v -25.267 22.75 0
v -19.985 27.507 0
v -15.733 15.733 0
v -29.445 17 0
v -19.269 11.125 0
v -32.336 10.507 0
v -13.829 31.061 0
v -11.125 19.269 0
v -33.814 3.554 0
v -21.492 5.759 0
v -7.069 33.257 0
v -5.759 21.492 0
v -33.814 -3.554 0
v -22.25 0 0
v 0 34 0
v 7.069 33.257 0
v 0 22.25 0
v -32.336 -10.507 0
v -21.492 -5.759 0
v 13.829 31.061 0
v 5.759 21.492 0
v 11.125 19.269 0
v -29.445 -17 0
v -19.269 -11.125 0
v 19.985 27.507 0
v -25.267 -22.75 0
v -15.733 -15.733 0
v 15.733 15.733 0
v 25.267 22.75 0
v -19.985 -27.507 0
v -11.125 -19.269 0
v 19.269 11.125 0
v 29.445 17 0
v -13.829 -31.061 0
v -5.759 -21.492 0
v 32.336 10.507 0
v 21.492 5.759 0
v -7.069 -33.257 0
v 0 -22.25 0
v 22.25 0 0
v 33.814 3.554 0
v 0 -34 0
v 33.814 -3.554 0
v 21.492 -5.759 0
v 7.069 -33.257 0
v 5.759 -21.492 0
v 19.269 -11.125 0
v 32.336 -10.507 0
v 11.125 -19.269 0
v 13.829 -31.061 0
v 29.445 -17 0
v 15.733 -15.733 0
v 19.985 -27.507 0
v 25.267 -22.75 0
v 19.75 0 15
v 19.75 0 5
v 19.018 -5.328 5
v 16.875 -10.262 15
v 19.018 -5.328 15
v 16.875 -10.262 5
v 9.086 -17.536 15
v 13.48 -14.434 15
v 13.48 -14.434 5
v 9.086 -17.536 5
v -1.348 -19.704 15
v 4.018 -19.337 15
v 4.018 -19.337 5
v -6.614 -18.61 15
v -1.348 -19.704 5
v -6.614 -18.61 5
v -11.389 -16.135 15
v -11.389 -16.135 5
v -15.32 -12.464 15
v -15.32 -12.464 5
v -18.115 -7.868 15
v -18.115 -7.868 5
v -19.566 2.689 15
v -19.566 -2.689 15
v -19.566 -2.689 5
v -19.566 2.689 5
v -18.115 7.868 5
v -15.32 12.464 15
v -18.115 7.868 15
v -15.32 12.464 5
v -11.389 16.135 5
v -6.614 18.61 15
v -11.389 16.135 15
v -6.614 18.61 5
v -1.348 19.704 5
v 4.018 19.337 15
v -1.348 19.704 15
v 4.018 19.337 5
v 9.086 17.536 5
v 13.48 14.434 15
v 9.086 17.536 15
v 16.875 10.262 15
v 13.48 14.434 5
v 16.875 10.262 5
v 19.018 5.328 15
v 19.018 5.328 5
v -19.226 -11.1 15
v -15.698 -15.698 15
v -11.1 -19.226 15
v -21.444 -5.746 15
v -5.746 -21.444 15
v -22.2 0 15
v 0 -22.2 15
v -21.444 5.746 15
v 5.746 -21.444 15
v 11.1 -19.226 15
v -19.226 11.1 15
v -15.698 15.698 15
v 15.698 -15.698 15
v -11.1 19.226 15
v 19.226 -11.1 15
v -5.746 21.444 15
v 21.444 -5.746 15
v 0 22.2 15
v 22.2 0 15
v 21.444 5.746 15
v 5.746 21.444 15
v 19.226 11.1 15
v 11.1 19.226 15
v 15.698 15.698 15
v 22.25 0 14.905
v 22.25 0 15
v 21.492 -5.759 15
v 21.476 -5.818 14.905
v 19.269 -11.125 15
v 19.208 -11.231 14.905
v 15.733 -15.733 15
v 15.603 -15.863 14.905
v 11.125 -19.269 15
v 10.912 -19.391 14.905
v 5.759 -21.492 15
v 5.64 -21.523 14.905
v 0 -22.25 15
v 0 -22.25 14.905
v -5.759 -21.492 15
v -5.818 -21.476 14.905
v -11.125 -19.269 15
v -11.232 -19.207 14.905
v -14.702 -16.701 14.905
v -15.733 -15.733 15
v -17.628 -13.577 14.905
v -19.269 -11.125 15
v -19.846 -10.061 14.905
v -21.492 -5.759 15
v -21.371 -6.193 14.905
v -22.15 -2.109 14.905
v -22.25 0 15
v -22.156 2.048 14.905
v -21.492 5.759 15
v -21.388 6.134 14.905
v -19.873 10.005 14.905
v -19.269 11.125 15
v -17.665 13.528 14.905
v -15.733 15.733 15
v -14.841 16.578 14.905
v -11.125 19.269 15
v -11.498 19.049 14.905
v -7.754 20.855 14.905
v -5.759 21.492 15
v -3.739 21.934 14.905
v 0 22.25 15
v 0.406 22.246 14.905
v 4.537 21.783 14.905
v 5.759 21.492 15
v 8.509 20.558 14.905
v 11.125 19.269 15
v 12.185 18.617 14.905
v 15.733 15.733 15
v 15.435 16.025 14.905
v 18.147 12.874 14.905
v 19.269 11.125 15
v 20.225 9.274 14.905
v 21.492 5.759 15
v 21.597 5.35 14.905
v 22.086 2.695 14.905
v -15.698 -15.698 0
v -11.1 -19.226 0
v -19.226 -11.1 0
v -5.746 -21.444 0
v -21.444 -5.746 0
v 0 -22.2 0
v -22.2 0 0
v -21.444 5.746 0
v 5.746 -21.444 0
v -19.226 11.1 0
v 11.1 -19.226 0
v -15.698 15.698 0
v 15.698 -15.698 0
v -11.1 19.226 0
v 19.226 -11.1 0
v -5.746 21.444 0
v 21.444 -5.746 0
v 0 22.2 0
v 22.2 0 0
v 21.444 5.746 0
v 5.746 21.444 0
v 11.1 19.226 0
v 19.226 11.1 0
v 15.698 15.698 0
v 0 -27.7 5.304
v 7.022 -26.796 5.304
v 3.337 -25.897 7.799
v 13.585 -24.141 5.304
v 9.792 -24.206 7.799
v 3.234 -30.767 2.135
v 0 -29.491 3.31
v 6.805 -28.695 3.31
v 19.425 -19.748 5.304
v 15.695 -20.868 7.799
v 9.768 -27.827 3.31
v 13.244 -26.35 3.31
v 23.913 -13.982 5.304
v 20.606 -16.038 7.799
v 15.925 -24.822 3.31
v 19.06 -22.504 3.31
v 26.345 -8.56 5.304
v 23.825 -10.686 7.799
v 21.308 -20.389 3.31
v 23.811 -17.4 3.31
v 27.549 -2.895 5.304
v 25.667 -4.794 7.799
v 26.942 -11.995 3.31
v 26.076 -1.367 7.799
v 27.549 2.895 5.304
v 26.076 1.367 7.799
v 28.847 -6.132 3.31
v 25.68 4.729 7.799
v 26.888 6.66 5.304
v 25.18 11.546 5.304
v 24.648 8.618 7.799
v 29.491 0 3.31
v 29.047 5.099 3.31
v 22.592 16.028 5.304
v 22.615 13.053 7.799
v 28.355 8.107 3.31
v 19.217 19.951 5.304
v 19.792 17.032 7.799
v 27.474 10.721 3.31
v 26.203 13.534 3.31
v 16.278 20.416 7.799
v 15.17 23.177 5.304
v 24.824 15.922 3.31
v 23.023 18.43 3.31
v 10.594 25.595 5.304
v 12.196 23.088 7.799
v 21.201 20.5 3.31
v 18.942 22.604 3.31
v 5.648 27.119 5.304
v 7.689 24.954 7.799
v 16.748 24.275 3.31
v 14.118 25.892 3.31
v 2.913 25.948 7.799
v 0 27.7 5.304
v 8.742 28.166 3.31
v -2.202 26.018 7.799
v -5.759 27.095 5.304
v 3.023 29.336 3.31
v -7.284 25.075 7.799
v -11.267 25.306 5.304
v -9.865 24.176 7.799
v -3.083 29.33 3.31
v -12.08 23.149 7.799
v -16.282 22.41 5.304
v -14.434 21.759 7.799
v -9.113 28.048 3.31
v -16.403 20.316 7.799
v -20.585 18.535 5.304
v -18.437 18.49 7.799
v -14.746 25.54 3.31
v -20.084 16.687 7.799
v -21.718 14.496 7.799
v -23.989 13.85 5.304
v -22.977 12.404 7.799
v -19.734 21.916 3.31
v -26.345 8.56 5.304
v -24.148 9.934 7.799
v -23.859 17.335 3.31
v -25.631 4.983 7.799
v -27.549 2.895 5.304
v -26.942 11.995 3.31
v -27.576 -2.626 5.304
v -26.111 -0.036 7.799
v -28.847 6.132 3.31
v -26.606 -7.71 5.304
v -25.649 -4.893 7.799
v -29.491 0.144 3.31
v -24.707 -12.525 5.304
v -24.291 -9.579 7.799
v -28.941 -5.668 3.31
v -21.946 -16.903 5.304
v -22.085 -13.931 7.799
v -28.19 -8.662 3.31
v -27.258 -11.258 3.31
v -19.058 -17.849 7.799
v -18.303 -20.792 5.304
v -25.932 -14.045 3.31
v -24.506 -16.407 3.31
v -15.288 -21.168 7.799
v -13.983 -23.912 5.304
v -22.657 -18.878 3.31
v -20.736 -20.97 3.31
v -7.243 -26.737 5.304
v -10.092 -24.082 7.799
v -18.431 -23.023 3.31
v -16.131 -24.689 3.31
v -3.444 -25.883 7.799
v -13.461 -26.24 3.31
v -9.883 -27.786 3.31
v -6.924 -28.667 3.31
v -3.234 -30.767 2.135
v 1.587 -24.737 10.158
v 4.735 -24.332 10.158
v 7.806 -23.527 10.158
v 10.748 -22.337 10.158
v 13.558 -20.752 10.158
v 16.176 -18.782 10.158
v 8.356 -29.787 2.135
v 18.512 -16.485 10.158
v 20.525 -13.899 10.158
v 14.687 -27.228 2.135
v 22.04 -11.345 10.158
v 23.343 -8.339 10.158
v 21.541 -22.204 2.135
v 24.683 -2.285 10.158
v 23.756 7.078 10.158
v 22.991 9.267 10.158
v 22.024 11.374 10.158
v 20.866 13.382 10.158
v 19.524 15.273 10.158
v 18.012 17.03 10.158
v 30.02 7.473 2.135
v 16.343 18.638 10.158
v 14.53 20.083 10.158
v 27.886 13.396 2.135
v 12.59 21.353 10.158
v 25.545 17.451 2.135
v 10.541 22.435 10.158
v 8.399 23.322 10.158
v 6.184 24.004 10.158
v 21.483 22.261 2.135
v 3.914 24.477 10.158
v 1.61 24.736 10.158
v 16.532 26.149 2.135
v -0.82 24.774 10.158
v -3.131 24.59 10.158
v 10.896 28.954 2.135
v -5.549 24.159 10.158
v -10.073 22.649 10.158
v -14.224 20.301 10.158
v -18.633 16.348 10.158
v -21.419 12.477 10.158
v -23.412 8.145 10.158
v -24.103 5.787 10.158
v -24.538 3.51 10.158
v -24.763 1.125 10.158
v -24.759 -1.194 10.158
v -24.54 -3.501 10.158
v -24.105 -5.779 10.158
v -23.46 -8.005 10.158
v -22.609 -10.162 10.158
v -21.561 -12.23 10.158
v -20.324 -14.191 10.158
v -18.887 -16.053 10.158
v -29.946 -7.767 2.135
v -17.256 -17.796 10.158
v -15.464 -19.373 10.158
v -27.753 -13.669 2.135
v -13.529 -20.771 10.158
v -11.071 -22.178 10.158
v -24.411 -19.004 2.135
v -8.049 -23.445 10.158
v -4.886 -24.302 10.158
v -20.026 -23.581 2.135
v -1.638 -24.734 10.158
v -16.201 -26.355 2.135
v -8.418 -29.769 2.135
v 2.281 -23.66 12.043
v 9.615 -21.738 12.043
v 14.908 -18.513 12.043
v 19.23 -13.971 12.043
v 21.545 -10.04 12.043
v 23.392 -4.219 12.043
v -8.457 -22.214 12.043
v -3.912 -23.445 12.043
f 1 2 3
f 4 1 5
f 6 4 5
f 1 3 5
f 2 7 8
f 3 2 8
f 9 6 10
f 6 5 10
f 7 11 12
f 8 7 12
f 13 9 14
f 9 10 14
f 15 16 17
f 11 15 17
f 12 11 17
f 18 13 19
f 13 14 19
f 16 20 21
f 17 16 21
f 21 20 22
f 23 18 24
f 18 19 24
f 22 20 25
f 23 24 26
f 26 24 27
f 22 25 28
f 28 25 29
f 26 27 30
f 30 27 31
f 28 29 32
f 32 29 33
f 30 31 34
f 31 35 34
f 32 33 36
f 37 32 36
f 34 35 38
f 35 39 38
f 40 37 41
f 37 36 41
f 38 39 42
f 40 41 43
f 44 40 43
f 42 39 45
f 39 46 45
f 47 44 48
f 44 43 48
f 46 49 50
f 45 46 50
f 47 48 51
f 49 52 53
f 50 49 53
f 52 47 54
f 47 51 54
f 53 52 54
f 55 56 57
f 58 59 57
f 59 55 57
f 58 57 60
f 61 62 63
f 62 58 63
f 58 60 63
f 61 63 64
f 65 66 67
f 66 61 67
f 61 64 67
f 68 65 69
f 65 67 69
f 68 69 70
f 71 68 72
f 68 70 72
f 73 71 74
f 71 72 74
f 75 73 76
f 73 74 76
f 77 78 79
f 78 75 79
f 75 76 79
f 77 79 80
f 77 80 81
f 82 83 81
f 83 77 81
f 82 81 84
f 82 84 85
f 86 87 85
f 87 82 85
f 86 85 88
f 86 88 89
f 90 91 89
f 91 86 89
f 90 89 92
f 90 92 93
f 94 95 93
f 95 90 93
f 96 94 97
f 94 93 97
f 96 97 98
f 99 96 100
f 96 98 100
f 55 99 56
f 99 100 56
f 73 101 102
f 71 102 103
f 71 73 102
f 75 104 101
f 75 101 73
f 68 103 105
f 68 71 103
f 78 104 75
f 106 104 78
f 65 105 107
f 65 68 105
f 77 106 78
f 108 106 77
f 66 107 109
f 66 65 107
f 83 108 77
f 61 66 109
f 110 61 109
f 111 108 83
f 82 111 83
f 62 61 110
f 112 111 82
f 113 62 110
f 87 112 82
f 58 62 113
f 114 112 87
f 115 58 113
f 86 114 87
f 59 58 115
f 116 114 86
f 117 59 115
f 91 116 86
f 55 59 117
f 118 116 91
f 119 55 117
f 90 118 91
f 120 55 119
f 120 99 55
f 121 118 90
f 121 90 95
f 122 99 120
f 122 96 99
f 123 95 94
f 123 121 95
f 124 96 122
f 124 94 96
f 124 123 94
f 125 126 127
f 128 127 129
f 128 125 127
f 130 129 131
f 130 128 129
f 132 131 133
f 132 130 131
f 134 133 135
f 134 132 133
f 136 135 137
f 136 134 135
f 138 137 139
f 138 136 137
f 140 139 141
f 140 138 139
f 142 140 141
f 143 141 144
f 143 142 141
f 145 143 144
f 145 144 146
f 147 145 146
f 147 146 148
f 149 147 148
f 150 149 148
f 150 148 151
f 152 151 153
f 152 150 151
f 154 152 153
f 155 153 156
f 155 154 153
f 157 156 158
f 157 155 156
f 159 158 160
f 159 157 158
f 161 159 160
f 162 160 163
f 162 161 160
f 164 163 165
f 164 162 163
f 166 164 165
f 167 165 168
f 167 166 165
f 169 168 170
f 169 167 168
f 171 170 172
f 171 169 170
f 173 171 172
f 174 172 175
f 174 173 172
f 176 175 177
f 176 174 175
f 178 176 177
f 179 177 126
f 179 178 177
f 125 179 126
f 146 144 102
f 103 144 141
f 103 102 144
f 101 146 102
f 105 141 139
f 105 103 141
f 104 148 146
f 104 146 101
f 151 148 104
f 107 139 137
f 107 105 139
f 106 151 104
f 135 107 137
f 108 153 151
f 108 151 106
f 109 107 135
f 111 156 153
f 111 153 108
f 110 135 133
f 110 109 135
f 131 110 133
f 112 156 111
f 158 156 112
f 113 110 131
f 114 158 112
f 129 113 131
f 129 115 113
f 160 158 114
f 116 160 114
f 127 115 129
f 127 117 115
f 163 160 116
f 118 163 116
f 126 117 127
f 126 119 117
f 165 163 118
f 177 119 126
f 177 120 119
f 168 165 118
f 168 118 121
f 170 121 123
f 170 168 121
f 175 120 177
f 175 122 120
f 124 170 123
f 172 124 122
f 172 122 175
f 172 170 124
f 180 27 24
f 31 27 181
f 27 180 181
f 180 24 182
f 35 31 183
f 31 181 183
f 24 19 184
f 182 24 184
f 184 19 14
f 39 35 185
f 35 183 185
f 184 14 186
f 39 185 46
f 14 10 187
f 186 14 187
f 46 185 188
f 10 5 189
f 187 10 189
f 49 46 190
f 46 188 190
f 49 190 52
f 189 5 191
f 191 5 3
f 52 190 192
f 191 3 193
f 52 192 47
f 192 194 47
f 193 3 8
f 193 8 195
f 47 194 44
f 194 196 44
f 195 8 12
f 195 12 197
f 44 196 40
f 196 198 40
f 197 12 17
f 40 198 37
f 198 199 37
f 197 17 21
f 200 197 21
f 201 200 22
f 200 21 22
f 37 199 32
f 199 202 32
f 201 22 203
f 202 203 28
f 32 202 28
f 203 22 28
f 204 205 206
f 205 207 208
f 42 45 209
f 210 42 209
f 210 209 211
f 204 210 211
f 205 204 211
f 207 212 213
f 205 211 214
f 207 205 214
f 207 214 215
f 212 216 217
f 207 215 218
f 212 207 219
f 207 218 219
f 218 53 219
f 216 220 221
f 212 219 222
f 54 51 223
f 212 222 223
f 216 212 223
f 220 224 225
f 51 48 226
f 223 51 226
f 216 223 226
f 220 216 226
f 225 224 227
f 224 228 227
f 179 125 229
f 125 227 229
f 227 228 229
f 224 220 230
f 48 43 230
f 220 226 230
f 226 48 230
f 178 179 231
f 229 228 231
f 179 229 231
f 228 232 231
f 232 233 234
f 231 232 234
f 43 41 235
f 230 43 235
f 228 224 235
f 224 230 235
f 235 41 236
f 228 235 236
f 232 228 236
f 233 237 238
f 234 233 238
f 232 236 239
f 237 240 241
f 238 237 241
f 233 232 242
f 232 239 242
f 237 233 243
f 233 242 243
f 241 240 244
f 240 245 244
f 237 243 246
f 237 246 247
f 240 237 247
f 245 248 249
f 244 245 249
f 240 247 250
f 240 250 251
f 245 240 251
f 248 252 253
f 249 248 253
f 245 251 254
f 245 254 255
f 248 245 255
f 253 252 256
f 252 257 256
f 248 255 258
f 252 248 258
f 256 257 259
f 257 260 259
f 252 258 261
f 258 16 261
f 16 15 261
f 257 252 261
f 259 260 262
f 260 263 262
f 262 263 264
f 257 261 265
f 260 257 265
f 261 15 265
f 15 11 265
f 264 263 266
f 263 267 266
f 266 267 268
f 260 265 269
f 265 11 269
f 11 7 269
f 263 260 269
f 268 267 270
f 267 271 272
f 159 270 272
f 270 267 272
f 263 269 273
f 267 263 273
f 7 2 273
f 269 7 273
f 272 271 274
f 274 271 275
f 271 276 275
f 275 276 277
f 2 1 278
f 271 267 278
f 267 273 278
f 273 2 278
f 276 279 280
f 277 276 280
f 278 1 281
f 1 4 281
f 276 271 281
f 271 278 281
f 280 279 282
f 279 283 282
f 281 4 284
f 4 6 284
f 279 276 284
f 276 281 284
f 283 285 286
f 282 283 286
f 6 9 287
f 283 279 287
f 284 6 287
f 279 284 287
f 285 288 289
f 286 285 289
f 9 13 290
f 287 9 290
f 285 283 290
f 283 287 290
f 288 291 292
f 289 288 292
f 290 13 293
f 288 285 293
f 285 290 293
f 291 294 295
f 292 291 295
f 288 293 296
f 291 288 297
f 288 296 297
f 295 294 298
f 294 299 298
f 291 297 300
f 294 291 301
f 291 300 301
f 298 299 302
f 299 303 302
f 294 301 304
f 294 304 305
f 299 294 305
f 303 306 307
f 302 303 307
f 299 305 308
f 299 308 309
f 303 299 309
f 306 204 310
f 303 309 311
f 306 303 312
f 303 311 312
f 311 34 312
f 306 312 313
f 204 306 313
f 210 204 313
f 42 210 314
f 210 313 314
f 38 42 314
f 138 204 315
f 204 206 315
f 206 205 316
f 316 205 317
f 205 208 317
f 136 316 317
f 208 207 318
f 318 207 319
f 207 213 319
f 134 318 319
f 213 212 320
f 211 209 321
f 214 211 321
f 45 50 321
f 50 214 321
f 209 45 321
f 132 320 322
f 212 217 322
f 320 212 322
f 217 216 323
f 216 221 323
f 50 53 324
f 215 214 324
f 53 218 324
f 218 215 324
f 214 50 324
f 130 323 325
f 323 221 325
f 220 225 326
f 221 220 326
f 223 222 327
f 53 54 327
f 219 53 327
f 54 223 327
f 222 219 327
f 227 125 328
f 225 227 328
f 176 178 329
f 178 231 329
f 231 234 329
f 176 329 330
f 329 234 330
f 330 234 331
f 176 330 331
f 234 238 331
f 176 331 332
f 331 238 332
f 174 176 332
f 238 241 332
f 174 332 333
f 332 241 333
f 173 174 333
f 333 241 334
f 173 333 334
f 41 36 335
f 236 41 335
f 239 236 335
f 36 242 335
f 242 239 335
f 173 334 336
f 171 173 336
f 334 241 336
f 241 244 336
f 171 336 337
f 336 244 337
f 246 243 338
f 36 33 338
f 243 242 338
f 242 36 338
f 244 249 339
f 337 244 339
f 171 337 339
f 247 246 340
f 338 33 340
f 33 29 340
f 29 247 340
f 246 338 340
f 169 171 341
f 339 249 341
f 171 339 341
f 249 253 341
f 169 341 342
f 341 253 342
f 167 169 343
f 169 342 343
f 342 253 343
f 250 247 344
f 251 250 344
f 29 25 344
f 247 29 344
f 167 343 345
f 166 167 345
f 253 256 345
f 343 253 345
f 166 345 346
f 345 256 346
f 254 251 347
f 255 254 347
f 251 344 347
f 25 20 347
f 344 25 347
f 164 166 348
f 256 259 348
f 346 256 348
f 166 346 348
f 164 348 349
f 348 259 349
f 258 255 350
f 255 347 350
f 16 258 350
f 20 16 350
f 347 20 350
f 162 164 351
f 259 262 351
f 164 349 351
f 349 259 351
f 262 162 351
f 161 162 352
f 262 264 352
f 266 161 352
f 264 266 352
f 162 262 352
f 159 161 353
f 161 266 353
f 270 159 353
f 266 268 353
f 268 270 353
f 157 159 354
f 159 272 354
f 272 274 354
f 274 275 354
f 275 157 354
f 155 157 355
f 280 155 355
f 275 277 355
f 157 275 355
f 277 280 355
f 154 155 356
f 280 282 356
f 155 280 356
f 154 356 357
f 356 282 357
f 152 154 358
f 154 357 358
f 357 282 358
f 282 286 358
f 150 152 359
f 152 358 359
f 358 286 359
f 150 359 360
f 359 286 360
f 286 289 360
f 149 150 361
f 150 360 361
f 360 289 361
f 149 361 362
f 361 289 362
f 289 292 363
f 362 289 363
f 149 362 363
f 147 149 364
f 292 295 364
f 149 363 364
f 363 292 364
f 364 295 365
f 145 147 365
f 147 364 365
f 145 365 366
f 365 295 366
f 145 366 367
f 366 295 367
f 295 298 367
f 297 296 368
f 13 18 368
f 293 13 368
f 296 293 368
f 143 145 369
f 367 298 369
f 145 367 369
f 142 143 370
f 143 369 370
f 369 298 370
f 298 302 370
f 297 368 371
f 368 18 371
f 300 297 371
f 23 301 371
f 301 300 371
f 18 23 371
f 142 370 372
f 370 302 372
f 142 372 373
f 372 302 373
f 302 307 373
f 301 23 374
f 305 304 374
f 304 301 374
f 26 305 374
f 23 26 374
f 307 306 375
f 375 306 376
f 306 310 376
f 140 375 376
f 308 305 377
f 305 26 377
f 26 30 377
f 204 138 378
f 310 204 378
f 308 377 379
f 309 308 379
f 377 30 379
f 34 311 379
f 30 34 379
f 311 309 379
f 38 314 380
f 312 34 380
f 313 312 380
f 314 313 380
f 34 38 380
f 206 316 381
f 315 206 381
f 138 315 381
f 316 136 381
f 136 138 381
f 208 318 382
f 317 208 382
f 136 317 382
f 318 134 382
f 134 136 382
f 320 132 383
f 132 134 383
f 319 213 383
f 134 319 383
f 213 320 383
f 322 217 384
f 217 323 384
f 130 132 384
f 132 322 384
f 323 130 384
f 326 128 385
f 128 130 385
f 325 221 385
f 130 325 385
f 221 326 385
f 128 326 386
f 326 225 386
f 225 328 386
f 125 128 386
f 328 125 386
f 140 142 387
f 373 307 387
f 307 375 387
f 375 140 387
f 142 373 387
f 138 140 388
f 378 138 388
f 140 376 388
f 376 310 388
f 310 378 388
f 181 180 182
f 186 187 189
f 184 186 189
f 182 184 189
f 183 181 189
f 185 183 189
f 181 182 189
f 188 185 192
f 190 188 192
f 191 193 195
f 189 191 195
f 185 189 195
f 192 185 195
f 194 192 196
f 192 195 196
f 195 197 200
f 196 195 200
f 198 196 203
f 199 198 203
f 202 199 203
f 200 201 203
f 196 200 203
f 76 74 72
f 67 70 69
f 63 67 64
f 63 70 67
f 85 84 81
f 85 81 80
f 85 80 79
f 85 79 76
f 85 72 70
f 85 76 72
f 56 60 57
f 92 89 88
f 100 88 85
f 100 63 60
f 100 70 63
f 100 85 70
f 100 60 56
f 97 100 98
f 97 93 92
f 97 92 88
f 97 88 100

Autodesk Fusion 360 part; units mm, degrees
sketch "Sketch1" plane through (0, 0, 0) normal (0, 0, 1) x (1, 0, 0)
  circle A0 centre (0, 0) radius 19.75
  circle A1 centre (0, 0) radius 22.25
  dimension "d1" = 39.5
  dimension "d2" = 44.5
extrude "Extrude1" add sketch "Sketch1" along normal blind 5 contours A0
extrude "Extrude2" add sketch "Sketch1" along normal blind 15
sketch "Sketch2" plane through (0, 0, 0) normal (1, 0, 0) x (0, 1, 0)
  spline S0 degree 2 poles (-22.2, 15) (-28, 4) (-34, 0) knots 0 0 0 1.939246 1.939246 1.939246 weights 1 3 1
  line L0 (-22.2, 15) -> (-22.2, 0)
  line L1 (-22.2, 0) -> (-34, 0)
revolve "Revolve1" add sketch "Sketch2" angle 360 about axis through (0, 0, 1.75) along (0, 0, 1)
